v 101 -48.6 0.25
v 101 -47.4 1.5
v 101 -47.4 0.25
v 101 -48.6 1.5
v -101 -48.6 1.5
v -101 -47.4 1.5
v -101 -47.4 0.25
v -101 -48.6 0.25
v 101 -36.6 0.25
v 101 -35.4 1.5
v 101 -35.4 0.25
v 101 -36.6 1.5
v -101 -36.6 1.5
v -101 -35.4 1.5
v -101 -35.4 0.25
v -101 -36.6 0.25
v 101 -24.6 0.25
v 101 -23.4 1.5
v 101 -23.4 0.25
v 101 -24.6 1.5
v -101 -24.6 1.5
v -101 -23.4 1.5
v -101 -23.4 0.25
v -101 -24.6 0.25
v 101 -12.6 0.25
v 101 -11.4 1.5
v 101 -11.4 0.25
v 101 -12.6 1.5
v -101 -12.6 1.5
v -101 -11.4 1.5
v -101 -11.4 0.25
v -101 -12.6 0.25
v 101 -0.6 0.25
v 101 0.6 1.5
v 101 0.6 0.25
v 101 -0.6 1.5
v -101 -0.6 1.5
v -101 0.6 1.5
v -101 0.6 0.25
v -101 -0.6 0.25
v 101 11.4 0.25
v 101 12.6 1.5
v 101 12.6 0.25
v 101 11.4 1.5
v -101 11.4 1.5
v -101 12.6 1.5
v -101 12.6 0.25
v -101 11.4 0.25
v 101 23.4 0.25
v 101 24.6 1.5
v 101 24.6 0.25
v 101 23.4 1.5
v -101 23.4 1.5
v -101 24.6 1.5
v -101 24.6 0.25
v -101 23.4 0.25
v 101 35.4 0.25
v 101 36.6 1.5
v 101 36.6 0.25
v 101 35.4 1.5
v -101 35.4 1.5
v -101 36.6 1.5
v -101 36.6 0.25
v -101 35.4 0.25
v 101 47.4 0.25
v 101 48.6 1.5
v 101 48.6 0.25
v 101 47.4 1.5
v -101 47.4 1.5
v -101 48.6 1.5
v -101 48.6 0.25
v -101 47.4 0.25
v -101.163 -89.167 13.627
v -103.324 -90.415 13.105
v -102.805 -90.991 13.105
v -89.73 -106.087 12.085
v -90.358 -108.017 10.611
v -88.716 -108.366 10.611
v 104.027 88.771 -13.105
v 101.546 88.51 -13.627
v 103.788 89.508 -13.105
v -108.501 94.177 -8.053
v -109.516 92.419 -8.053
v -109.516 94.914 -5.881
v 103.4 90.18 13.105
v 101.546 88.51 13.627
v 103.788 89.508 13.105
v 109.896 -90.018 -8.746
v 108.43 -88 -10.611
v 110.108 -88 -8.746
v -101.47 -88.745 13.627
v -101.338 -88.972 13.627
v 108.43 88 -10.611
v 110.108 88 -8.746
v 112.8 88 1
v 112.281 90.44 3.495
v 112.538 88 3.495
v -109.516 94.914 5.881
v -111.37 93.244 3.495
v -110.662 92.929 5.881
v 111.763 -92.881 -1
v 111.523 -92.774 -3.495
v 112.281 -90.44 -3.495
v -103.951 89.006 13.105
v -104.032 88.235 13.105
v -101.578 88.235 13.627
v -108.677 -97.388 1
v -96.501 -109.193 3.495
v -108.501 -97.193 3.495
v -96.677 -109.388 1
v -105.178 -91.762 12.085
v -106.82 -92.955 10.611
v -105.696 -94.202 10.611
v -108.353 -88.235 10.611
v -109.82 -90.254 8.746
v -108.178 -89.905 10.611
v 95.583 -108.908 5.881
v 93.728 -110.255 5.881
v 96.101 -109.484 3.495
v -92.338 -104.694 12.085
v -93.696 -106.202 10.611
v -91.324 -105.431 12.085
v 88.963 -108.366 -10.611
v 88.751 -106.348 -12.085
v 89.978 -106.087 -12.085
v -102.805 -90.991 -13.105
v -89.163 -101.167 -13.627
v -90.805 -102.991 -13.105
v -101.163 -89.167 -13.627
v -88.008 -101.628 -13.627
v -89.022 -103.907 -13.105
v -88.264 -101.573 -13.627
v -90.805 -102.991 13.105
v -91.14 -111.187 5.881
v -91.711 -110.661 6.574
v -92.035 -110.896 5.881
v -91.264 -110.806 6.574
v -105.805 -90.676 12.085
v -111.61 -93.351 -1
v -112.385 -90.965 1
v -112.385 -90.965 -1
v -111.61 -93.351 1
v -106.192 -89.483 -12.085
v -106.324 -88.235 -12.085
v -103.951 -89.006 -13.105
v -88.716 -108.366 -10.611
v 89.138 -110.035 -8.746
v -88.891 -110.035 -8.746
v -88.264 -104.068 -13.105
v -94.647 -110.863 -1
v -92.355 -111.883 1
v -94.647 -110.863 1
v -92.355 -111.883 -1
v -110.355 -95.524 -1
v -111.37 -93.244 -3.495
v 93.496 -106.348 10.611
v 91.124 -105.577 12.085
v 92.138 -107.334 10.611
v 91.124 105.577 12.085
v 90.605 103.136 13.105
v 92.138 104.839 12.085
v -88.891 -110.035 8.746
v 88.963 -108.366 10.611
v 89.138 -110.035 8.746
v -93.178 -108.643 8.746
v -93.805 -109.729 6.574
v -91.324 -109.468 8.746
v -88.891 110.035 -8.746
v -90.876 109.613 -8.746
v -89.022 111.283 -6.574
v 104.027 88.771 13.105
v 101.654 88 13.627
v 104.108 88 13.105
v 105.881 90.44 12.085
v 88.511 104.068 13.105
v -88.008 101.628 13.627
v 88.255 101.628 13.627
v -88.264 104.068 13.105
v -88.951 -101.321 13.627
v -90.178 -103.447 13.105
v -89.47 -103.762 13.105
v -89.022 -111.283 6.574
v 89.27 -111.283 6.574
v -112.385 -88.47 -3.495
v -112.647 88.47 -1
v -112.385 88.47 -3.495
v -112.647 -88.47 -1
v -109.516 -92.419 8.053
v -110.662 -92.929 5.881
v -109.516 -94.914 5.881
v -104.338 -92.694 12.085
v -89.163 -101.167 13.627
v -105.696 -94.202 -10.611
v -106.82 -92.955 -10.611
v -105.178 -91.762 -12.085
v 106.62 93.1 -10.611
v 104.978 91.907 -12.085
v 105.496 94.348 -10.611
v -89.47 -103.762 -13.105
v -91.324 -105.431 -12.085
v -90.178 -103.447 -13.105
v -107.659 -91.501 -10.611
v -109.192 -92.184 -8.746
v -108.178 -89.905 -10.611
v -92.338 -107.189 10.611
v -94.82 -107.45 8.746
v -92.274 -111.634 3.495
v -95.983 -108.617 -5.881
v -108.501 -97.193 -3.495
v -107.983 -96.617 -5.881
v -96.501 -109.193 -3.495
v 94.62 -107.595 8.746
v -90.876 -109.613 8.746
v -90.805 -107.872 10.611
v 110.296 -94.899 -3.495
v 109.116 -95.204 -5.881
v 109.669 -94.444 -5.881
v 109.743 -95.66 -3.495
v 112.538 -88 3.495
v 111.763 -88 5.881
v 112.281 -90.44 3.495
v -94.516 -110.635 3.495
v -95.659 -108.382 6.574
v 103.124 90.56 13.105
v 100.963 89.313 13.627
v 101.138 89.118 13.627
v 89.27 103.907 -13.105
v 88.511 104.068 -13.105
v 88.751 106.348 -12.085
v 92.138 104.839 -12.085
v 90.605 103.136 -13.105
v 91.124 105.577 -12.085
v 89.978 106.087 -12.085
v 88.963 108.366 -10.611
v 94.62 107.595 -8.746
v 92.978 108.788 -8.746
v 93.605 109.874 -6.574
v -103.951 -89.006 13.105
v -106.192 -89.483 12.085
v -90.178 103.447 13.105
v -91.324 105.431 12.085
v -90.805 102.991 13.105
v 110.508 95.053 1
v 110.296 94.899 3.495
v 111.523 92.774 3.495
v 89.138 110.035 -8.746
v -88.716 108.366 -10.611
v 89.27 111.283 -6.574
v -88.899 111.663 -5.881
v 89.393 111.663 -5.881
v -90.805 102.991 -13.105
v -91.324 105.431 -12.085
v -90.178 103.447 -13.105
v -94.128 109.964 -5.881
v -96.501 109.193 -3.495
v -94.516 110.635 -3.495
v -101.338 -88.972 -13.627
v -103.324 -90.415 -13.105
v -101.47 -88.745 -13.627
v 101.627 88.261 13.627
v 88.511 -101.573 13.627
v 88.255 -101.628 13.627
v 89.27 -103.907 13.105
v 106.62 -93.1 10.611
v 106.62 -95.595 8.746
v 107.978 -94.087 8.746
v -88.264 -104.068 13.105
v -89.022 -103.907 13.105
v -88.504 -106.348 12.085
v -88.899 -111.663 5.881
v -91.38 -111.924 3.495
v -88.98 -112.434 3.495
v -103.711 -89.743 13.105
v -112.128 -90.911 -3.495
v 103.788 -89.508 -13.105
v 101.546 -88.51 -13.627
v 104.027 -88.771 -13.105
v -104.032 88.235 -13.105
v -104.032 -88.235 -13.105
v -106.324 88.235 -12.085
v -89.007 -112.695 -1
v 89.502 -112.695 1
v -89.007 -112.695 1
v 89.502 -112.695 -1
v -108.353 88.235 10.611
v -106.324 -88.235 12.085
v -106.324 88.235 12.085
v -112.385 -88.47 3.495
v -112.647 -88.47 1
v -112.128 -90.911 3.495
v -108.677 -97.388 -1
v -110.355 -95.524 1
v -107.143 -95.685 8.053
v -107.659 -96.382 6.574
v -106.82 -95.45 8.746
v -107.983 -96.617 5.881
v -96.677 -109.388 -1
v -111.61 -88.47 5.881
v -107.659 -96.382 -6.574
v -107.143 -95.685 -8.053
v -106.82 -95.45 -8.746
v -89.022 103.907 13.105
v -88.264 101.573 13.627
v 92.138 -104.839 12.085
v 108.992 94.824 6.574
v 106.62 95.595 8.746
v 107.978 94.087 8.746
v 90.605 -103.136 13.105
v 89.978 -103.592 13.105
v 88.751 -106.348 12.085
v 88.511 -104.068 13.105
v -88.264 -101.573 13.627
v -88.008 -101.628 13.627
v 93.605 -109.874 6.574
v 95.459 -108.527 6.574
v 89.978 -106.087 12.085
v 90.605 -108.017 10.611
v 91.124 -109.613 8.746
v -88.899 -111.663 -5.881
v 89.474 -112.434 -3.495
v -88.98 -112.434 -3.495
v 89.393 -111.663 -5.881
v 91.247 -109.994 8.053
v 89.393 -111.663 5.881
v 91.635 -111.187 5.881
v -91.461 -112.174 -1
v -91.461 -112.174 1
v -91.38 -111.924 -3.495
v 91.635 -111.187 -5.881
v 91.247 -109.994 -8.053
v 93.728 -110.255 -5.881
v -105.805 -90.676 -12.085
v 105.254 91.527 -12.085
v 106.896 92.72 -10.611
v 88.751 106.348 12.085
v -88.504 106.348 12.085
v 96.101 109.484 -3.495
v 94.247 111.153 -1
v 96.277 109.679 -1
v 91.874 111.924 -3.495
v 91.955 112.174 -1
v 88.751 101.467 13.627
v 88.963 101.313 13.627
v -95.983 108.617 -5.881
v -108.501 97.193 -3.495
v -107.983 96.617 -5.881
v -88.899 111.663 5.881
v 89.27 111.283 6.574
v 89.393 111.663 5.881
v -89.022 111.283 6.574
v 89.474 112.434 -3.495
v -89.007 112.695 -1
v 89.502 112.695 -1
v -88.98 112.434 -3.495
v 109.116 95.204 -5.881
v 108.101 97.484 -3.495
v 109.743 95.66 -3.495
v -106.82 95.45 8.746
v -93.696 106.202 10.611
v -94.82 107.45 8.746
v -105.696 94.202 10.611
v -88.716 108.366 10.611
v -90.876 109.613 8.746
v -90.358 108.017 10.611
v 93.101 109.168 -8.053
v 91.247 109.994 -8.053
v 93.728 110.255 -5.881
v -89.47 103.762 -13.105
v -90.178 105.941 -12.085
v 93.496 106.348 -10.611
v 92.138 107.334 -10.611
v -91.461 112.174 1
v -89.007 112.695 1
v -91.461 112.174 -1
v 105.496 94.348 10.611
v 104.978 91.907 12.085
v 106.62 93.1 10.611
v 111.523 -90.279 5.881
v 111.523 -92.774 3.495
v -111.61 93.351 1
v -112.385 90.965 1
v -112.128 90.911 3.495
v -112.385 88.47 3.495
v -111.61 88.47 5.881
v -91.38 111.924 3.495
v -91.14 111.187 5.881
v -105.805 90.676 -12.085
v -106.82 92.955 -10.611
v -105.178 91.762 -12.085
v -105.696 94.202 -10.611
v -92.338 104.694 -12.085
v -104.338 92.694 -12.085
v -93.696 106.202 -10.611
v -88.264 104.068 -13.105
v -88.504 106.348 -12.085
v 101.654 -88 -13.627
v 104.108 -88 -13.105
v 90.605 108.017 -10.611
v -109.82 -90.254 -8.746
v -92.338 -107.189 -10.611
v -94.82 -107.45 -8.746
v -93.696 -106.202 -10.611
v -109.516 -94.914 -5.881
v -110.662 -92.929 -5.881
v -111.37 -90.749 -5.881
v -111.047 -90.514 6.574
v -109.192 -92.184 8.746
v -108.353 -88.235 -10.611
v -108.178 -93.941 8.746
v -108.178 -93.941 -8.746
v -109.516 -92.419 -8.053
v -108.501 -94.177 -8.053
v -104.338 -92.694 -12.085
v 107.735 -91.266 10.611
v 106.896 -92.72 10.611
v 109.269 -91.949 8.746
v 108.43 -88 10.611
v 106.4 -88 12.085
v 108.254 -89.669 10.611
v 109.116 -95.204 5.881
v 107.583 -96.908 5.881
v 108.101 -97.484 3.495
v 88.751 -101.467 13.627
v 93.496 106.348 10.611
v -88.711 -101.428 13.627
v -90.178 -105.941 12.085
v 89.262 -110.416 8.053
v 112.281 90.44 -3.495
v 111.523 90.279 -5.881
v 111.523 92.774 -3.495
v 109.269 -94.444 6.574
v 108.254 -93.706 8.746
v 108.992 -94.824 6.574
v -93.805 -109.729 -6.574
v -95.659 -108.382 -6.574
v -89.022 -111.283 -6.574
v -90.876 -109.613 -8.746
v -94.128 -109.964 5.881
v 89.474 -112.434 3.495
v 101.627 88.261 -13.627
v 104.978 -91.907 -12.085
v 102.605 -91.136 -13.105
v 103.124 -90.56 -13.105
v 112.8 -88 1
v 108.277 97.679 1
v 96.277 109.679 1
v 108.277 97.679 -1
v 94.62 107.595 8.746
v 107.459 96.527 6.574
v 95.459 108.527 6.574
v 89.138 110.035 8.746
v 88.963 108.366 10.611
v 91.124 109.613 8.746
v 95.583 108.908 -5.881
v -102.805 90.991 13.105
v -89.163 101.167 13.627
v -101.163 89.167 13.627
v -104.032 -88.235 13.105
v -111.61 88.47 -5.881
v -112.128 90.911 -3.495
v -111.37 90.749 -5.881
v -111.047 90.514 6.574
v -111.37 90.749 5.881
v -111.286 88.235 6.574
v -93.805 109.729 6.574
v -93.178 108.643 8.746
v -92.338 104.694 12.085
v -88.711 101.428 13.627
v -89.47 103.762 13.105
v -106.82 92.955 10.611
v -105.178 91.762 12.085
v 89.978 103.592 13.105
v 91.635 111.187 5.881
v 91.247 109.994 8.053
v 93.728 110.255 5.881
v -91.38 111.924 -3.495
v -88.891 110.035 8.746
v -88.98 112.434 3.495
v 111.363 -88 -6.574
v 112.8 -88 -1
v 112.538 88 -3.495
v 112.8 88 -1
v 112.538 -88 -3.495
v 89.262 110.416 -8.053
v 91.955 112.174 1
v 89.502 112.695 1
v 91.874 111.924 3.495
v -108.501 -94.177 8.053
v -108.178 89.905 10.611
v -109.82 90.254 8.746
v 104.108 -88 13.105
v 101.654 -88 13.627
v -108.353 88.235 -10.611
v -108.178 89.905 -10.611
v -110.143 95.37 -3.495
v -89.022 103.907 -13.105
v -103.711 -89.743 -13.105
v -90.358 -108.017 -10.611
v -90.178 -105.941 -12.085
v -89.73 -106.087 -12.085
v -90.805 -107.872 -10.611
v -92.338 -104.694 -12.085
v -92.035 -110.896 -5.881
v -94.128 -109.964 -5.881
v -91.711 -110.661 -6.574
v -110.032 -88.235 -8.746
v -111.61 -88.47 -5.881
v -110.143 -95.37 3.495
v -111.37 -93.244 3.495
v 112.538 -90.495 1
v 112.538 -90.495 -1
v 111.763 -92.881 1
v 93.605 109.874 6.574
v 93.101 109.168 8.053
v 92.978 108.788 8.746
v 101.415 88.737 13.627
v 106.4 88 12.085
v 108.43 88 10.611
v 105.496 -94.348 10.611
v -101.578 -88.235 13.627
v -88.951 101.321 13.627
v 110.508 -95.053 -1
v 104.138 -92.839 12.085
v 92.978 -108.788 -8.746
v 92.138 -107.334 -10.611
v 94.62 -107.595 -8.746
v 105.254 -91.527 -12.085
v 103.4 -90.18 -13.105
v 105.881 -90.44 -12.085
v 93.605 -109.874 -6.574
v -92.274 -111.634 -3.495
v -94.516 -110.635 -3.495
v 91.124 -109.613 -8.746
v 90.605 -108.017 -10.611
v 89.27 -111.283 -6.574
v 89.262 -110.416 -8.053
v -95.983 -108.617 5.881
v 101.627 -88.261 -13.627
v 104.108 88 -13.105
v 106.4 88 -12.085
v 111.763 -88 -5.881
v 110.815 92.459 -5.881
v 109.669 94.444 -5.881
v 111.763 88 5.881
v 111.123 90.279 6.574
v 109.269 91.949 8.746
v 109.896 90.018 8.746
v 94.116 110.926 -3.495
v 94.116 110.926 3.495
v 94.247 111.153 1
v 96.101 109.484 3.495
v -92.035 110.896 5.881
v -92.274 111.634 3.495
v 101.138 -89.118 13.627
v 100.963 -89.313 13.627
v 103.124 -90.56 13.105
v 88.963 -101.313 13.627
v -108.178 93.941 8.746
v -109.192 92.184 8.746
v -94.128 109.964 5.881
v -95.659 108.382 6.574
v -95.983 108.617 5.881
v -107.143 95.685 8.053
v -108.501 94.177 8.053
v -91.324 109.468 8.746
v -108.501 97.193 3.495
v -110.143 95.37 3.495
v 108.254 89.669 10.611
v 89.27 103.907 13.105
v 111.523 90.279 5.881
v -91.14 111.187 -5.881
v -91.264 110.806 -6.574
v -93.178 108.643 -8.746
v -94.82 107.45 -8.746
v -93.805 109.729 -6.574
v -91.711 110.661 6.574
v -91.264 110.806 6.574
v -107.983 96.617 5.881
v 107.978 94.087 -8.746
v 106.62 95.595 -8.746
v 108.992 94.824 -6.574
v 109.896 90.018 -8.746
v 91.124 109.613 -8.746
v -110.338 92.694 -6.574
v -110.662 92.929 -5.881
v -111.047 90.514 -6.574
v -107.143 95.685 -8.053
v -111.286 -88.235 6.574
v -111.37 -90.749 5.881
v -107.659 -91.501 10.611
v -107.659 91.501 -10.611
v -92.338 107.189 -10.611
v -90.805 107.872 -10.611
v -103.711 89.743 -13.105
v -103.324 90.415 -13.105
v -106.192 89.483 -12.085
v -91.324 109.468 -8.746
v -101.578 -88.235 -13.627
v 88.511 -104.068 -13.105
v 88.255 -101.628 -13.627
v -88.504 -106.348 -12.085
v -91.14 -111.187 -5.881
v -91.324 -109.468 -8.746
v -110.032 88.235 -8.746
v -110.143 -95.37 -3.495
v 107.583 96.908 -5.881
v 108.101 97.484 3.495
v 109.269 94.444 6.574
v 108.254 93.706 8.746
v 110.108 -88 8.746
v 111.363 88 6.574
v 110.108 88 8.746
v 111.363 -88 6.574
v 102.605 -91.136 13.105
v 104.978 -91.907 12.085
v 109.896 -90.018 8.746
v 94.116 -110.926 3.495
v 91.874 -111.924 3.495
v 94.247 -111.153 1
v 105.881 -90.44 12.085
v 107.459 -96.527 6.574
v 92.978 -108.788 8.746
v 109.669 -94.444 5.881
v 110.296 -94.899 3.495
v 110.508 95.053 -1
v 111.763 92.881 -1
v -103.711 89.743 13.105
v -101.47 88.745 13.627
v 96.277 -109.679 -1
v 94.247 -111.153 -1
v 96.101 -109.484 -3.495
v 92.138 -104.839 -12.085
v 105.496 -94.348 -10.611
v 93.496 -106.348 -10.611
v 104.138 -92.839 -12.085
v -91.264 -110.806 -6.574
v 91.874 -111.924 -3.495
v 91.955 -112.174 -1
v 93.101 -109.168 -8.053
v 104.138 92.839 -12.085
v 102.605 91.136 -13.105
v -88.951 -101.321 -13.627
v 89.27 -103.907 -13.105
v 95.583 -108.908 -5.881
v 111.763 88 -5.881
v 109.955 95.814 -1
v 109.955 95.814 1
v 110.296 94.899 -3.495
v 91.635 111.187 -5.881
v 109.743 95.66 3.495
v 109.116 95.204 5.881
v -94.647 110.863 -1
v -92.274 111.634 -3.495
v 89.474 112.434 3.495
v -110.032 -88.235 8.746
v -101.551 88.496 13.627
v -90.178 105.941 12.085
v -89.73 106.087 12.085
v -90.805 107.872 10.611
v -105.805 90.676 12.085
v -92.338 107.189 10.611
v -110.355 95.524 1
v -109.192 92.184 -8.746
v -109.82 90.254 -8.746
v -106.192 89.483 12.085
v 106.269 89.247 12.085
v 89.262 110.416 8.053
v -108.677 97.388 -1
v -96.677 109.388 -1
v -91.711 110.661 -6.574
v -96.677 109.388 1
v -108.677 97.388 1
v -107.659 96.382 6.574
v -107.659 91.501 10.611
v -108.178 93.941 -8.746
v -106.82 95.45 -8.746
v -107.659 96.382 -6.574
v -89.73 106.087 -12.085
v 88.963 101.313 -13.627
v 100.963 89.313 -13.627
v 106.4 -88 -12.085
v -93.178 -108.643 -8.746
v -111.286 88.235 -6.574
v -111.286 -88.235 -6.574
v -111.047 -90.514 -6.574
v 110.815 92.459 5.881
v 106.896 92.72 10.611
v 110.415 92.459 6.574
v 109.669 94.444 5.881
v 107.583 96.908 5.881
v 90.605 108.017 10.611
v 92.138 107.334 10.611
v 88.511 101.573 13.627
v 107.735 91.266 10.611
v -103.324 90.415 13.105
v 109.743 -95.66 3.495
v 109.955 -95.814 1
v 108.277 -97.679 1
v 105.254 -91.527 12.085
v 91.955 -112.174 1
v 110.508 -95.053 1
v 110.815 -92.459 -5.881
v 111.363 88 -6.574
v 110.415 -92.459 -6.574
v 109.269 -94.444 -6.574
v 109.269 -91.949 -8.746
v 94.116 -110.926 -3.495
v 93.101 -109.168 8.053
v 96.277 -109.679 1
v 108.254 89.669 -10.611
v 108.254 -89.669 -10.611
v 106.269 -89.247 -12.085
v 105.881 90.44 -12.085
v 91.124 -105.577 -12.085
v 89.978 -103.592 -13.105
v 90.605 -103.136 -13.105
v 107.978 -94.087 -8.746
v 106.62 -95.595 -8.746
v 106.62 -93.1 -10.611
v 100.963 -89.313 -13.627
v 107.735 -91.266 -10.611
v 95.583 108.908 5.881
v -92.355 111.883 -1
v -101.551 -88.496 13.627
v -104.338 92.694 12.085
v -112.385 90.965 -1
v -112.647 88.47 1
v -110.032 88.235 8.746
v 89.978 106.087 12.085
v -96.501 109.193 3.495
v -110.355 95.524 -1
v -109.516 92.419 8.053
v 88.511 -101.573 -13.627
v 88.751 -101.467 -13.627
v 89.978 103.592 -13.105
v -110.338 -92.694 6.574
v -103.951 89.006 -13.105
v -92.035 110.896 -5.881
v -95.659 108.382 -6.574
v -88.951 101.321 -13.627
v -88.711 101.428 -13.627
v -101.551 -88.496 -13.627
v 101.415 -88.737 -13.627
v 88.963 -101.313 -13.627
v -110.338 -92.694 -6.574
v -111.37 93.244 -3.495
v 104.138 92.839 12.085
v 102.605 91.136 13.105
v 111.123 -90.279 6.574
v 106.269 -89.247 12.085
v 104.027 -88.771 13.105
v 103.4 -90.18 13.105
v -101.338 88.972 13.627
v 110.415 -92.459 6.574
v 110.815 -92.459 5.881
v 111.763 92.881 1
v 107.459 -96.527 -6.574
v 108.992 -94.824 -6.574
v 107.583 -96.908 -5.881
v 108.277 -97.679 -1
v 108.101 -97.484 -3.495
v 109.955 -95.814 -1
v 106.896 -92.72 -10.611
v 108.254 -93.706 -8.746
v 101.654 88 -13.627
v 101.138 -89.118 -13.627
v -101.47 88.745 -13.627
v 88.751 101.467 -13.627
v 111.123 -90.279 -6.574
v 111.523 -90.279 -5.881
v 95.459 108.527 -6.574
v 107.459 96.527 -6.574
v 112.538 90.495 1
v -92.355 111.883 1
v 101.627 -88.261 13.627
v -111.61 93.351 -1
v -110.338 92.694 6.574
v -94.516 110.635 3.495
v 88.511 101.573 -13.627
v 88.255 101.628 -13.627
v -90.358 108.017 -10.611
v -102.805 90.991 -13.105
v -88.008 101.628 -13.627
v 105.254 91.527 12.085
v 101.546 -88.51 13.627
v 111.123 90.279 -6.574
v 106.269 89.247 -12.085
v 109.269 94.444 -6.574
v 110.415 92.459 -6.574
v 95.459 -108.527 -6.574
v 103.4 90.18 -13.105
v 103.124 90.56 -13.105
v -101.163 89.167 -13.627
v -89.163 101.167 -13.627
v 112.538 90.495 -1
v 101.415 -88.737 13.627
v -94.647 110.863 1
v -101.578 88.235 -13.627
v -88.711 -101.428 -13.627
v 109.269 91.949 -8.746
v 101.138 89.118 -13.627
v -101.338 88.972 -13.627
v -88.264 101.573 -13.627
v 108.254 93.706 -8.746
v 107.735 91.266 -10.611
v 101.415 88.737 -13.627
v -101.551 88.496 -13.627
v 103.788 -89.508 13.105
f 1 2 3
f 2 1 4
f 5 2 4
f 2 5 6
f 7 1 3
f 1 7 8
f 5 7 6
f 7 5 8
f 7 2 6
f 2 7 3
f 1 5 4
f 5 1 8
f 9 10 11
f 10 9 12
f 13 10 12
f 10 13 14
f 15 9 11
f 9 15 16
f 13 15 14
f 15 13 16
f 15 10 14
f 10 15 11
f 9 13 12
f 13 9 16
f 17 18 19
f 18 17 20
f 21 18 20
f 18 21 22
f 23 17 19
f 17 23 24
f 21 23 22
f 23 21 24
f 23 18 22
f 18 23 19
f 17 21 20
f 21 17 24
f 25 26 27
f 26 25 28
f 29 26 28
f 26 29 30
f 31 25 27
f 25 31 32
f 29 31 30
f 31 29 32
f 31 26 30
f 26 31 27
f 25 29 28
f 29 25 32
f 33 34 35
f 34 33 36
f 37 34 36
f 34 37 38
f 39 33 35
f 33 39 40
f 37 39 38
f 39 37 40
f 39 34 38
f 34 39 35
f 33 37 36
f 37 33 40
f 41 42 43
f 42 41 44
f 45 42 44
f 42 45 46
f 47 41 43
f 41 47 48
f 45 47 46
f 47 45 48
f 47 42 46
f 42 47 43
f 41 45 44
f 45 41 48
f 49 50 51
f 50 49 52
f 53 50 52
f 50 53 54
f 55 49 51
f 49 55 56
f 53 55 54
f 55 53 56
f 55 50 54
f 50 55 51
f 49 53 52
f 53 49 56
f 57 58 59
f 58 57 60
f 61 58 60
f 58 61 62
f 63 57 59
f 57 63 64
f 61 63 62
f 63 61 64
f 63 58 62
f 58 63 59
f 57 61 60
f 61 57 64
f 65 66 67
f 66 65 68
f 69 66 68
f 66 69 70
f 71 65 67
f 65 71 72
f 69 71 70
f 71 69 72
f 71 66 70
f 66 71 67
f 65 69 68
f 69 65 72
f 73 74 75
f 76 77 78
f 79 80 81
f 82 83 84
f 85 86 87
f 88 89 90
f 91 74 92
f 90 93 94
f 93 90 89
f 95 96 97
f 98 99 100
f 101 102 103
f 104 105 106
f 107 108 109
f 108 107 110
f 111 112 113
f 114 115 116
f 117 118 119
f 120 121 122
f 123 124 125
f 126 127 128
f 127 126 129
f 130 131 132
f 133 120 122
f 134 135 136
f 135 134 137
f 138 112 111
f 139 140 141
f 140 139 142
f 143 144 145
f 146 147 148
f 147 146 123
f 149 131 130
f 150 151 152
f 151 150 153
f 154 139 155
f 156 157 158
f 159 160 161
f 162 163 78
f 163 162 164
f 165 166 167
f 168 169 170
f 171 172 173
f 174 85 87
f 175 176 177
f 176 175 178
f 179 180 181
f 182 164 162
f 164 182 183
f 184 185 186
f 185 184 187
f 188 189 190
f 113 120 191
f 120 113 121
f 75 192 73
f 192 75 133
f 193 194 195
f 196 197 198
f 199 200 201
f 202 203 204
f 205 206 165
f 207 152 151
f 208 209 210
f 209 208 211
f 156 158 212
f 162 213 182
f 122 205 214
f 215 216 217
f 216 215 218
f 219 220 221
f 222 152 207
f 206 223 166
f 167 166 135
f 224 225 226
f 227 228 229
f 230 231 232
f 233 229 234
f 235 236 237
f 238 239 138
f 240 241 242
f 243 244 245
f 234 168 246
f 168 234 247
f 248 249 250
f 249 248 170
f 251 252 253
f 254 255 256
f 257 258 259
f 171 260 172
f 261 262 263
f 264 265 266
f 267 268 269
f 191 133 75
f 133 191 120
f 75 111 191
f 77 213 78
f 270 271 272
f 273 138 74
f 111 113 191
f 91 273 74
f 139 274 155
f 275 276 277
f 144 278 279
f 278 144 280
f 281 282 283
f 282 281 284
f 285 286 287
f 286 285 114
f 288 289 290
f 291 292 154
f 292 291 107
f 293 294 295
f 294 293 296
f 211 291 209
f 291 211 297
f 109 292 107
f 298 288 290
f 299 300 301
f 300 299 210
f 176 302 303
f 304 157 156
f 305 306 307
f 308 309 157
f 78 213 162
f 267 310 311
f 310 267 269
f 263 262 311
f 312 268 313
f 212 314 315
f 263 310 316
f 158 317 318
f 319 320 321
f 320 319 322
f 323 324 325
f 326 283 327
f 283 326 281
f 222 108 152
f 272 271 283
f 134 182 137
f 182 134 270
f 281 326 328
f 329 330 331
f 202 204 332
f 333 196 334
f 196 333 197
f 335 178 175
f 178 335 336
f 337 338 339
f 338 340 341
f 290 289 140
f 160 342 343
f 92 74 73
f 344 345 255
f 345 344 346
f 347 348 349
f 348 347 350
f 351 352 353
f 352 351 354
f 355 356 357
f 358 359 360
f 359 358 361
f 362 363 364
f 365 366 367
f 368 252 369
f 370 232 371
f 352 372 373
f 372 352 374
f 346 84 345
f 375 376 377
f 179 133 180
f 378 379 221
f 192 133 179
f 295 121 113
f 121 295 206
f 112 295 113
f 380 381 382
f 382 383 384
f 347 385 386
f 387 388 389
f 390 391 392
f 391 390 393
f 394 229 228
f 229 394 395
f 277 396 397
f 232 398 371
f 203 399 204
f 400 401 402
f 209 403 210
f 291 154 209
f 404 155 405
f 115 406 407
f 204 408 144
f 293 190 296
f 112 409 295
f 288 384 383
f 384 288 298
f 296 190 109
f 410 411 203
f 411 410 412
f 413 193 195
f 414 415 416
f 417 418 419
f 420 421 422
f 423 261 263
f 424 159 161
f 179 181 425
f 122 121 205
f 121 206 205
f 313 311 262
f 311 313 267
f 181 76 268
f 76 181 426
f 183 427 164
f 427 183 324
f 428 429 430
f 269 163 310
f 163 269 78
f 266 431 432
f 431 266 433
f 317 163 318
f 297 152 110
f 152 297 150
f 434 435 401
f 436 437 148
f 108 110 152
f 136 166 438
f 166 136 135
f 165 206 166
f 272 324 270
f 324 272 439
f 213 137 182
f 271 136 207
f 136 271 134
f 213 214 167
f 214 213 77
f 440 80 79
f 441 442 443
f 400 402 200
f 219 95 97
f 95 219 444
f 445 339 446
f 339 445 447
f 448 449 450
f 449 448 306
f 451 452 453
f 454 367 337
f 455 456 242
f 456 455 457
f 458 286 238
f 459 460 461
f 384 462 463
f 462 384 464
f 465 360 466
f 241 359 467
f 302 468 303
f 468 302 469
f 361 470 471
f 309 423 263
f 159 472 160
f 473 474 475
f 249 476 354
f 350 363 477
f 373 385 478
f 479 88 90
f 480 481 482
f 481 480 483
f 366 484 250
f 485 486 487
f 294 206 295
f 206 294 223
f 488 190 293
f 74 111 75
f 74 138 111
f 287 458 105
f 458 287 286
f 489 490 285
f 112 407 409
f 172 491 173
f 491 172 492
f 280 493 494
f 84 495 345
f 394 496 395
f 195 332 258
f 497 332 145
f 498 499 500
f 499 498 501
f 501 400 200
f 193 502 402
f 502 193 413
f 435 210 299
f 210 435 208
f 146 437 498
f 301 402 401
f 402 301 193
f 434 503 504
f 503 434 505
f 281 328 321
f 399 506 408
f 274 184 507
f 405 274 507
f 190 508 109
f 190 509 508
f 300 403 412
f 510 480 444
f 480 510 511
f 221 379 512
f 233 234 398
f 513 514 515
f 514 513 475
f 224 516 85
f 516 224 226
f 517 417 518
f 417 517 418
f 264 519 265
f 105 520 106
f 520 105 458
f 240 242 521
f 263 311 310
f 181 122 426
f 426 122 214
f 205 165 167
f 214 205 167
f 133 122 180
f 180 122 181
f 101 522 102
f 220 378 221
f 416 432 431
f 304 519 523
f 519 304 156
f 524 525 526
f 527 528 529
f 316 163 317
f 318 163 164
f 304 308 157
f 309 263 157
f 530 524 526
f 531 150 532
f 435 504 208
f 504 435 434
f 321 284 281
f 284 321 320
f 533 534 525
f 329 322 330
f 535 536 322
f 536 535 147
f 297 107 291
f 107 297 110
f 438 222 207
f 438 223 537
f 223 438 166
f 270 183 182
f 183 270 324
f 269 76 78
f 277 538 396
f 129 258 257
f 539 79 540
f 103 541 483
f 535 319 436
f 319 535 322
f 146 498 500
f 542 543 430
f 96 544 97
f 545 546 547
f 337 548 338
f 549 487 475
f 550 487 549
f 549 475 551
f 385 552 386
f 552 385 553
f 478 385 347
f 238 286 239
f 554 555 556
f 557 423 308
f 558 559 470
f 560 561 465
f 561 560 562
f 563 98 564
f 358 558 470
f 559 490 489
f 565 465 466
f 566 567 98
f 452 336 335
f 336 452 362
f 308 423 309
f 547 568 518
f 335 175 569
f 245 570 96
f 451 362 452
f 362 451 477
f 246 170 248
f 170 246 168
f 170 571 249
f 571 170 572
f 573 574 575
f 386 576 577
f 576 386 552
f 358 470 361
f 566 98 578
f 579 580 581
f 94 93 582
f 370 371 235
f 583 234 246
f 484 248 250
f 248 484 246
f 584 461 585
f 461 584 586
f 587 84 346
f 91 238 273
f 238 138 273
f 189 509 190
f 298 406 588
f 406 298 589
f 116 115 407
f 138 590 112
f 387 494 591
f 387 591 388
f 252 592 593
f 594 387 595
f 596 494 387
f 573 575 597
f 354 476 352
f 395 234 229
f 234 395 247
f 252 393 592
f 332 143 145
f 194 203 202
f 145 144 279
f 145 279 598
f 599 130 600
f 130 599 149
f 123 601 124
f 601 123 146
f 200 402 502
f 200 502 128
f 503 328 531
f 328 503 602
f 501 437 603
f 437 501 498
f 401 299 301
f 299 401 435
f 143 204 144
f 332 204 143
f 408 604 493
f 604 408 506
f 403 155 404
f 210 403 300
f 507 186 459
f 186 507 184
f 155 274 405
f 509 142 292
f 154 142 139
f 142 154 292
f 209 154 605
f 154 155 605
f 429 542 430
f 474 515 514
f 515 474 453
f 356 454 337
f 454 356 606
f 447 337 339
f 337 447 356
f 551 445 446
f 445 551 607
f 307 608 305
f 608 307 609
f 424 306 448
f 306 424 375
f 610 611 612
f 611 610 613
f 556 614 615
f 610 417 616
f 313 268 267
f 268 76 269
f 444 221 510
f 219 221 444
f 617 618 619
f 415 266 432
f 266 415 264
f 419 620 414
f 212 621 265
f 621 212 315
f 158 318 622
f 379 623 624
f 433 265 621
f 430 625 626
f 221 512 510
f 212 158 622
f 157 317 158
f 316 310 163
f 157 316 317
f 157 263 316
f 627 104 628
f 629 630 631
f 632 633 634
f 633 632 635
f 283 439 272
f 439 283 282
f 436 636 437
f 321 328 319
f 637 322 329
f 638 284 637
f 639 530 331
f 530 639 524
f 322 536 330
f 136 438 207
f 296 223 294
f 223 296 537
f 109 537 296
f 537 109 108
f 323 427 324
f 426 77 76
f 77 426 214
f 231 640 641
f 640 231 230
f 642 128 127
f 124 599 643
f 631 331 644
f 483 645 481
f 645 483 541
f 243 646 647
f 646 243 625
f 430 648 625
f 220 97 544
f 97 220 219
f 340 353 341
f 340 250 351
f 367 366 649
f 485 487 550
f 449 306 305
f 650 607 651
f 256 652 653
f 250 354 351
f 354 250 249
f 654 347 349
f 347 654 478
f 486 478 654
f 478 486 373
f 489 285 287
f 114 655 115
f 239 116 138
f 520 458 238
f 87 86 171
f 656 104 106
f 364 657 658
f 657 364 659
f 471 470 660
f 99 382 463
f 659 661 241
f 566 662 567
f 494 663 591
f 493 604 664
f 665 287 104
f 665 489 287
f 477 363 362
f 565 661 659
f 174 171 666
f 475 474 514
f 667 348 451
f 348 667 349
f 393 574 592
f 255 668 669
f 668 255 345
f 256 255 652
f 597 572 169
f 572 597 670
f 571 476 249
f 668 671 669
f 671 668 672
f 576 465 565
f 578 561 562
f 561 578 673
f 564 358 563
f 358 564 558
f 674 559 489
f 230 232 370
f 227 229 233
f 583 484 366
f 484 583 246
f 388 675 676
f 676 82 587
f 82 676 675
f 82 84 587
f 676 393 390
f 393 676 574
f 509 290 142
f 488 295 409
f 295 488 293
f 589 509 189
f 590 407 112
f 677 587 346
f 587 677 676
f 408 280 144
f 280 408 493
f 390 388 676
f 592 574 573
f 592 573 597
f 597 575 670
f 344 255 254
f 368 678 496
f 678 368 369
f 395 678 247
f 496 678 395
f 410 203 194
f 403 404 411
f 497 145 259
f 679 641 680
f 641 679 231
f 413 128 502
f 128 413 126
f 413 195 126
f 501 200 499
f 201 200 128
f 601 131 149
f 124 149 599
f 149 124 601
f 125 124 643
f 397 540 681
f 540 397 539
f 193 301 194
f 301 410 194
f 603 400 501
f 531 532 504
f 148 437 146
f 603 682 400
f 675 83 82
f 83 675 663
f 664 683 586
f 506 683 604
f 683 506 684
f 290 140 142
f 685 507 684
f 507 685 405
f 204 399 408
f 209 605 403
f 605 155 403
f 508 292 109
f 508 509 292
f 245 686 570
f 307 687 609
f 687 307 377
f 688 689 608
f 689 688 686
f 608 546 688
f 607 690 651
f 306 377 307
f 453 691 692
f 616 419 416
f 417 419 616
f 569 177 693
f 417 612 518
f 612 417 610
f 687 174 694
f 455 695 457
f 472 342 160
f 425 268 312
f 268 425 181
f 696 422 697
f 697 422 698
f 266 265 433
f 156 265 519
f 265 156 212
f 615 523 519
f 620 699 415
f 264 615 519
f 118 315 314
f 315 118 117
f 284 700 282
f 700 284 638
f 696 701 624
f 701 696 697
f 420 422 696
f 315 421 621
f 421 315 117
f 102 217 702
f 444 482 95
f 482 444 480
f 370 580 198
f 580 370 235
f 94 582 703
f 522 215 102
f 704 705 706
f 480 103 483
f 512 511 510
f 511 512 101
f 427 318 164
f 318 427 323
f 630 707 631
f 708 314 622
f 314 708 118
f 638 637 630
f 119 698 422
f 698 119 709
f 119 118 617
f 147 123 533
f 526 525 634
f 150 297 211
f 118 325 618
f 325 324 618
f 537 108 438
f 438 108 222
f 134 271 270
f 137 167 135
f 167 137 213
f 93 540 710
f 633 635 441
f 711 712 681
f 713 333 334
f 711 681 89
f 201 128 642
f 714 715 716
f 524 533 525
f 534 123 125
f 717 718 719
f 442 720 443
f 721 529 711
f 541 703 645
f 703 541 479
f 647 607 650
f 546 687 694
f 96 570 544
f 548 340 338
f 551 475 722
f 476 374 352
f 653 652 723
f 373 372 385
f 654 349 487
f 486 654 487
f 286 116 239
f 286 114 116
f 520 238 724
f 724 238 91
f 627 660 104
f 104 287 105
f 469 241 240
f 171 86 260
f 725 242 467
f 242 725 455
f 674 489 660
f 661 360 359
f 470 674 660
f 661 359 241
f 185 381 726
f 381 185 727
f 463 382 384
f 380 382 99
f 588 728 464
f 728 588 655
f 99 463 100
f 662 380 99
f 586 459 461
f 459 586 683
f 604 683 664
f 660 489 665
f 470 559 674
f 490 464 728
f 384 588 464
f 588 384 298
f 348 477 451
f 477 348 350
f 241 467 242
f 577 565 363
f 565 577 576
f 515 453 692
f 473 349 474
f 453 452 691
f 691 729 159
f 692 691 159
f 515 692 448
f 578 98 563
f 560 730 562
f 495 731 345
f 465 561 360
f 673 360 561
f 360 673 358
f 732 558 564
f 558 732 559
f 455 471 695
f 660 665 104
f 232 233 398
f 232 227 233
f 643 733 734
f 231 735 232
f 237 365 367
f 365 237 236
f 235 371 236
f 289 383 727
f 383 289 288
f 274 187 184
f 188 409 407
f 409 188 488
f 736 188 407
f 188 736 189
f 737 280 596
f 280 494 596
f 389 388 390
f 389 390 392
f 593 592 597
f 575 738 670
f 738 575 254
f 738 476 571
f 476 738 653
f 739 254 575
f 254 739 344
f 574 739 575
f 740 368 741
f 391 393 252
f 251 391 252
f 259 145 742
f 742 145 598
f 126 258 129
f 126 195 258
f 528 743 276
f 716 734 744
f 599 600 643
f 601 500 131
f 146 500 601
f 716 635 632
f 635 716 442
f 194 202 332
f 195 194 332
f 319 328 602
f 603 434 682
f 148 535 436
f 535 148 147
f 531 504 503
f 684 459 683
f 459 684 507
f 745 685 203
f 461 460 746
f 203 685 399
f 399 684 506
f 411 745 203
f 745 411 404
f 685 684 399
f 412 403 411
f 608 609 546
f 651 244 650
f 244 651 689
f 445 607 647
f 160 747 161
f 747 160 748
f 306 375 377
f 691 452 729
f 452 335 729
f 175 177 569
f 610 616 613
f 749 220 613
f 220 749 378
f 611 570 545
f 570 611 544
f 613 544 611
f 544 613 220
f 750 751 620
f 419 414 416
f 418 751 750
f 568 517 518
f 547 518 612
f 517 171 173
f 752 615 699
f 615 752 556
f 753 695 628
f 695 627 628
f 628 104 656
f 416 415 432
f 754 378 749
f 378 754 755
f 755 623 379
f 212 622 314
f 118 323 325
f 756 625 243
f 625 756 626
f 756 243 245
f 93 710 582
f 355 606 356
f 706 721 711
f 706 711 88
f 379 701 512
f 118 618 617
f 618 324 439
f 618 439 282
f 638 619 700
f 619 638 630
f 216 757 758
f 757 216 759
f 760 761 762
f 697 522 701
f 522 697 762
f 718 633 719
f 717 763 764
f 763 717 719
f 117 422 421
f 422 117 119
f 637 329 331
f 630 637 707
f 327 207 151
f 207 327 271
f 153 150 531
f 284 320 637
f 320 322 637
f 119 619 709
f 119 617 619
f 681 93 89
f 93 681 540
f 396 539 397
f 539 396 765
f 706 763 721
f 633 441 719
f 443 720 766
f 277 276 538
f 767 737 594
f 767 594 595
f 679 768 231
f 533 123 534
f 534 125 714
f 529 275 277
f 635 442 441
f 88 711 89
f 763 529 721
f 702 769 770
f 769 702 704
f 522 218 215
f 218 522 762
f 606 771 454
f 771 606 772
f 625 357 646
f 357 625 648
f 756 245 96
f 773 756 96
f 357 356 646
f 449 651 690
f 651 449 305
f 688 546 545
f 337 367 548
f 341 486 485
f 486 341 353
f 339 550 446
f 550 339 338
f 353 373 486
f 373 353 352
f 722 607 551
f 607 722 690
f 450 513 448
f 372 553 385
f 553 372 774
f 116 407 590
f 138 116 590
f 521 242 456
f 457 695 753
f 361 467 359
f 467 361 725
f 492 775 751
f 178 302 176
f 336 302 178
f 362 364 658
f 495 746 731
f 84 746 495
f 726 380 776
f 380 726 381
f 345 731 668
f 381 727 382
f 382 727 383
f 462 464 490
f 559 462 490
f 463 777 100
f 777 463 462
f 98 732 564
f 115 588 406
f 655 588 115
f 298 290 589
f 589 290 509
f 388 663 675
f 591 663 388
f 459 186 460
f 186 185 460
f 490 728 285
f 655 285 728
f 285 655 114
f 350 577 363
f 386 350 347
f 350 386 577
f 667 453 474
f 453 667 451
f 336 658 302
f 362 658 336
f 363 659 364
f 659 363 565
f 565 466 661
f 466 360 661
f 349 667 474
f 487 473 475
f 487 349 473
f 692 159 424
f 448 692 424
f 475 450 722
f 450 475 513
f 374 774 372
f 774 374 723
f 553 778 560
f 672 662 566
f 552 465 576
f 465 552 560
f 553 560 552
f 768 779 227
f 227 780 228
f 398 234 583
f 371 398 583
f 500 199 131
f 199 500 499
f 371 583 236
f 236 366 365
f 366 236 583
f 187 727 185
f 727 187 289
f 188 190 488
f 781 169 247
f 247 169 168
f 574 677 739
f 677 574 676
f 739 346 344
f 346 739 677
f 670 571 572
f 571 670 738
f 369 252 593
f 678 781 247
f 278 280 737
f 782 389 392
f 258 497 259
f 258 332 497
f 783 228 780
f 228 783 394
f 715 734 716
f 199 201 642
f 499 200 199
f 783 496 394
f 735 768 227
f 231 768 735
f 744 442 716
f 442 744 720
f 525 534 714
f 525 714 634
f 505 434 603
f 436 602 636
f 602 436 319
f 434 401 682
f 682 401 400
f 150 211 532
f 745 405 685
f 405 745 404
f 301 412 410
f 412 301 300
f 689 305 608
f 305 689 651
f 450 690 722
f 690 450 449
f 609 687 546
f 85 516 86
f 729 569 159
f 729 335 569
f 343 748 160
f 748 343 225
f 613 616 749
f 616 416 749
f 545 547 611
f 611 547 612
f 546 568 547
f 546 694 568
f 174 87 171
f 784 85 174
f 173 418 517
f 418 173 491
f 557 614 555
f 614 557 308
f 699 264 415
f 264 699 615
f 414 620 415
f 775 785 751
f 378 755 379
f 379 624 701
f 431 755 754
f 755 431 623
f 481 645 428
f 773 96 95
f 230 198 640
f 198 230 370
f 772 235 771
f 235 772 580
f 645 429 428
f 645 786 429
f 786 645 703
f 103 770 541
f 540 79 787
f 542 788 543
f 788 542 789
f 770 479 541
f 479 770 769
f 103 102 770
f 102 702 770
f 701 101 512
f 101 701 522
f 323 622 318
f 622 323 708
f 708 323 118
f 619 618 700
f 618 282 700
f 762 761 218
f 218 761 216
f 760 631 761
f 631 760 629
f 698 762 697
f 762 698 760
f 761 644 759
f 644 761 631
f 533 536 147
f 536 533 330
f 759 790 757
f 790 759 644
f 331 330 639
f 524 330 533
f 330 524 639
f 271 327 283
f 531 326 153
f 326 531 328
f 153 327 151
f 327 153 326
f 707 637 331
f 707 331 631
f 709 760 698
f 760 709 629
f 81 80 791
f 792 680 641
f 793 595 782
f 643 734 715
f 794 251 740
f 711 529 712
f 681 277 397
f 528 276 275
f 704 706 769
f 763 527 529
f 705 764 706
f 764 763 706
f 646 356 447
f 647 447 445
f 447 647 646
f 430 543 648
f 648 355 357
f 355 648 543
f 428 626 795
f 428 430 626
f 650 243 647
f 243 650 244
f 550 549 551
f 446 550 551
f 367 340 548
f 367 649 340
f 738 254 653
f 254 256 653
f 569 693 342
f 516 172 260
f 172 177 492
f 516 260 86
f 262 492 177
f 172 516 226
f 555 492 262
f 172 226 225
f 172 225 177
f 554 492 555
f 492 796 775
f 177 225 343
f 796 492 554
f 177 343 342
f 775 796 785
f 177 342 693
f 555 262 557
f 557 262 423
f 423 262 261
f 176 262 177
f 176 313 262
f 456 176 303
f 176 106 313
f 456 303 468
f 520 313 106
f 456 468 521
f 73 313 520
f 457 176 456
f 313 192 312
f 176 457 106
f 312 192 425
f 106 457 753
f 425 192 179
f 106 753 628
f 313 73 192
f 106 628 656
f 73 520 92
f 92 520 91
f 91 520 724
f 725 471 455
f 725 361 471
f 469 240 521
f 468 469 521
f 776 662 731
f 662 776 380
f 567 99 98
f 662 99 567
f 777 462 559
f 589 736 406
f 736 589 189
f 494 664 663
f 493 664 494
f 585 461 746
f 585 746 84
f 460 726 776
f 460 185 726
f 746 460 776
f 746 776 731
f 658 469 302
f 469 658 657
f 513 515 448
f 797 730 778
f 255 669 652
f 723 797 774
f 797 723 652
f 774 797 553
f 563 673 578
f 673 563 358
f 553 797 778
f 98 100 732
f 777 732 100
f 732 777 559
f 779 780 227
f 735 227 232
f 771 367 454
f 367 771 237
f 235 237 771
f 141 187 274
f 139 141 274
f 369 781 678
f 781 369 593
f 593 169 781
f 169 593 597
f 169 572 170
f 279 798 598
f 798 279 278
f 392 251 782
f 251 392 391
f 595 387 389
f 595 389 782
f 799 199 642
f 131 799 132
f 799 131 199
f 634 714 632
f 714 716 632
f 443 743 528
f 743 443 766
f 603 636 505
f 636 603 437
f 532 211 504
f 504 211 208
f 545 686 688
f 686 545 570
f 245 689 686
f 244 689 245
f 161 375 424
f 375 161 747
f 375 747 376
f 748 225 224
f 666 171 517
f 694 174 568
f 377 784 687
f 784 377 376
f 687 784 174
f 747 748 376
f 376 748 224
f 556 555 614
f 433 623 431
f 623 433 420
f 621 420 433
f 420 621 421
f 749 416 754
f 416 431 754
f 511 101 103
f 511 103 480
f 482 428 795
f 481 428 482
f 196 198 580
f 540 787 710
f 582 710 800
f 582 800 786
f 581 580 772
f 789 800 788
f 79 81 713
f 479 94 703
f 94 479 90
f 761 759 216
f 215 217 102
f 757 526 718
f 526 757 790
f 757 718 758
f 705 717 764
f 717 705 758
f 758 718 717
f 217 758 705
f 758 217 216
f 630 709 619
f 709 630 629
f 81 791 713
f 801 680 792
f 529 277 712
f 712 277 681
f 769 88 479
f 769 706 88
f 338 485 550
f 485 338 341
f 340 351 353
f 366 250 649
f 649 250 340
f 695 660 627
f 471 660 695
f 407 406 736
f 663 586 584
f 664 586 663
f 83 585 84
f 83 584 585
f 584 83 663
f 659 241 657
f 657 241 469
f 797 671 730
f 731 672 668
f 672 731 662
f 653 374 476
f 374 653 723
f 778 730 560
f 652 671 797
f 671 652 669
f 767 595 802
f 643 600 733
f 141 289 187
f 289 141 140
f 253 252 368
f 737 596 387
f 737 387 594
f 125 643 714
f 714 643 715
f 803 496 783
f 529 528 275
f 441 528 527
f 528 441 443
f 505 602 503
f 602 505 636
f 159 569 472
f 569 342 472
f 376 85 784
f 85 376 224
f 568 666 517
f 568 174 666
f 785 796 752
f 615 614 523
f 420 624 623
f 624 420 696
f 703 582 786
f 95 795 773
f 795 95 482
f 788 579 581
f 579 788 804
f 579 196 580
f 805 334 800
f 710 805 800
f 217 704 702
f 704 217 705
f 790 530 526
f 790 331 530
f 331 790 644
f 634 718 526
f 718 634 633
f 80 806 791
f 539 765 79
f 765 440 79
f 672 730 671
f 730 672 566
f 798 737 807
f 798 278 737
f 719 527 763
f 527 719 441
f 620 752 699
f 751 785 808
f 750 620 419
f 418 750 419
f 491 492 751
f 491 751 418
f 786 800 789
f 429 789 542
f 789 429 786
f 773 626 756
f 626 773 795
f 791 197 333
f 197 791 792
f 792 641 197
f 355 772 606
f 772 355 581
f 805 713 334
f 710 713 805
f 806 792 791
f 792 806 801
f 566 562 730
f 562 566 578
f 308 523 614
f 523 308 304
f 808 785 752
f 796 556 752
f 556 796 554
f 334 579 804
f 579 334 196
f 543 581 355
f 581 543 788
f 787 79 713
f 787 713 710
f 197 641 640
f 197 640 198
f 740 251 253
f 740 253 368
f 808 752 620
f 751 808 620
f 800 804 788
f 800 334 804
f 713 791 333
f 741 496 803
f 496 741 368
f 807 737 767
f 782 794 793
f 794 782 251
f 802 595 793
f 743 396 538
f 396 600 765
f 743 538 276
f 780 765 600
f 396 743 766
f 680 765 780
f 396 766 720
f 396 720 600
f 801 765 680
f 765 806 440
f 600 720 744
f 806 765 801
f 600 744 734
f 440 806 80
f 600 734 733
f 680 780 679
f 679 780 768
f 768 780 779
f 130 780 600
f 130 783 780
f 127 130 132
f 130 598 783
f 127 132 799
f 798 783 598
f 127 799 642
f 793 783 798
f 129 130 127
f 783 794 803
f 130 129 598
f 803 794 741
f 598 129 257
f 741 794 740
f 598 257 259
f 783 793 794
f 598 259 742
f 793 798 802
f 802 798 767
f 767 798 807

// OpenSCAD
// Parameters
sheet_length = 200; //[100:400:1]
sheet_width = 200; //[100:400:1]
sheet_thickness = 2; //[1:6:0.5]
corner_radius = 12; //[6:24:1]
edge_fillet_radius = 0.8; //[0.3:2:0.1]
texture_groove_width = 1.2; //[0.6:3:0.1]
texture_groove_depth = 0.25; //[0.1:0.8:0.05]
texture_groove_pitch = 12; //[6:30:1]
texture_groove_count = 9; //[3:25:1]
connect_overlap = 1; //[0.5:2:0.1]

// Base shapes
module silicone_sheet_body() {
  cube([sheet_length, sheet_width, sheet_thickness], center=true);
}

module rounded_corners() {
  linear_extrude(height=sheet_thickness, center=true) {
    polygon(points=[
      [sheet_length/2 - corner_radius, sheet_width/2],
      [-sheet_length/2 + corner_radius, sheet_width/2],
      [-sheet_length/2, sheet_width/2 - corner_radius],
      [-sheet_length/2, -sheet_width/2 + corner_radius],
      [-sheet_length/2 + corner_radius, -sheet_width/2],
      [sheet_length/2 - corner_radius, -sheet_width/2],
      [sheet_length/2, -sheet_width/2 + corner_radius],
      [sheet_length/2, sheet_width/2 - corner_radius]
    ]);
  }
}

module corner_round_sphere() {
  sphere(r=corner_radius, center=true);
}

module edge_fillet_sphere() {
  sphere(r=edge_fillet_radius, center=true);
}

module texture_groove(y_offset) {
  translate([0, y_offset, sheet_thickness/2 - texture_groove_depth/2])
    cube([sheet_length + 2*connect_overlap, texture_groove_width, texture_groove_depth + connect_overlap], center=true);
}

// Operations
module rounded_corners_minkowski() {
  minkowski() {
    rounded_corners();
    corner_round_sphere();
  }
}

module edge_chamfer_or_fillet() {
  minkowski() {
    rounded_corners_minkowski();
    edge_fillet_sphere();
  }
}

module surface_texture() {
  union() {
    for (i = [0 : texture_groove_count - 1]) {
      texture_groove((-((texture_groove_count-1)/2) + i) * texture_groove_pitch);
    }
  }
}

// Final output
module silicone_sheet_complete() {
  difference() {
    edge_chamfer_or_fillet();
    surface_texture();
  }
}

// Render the final silicone sheet
color([0.85, 0.85, 0.8]) // Off-white for silicone
silicone_sheet_complete();
